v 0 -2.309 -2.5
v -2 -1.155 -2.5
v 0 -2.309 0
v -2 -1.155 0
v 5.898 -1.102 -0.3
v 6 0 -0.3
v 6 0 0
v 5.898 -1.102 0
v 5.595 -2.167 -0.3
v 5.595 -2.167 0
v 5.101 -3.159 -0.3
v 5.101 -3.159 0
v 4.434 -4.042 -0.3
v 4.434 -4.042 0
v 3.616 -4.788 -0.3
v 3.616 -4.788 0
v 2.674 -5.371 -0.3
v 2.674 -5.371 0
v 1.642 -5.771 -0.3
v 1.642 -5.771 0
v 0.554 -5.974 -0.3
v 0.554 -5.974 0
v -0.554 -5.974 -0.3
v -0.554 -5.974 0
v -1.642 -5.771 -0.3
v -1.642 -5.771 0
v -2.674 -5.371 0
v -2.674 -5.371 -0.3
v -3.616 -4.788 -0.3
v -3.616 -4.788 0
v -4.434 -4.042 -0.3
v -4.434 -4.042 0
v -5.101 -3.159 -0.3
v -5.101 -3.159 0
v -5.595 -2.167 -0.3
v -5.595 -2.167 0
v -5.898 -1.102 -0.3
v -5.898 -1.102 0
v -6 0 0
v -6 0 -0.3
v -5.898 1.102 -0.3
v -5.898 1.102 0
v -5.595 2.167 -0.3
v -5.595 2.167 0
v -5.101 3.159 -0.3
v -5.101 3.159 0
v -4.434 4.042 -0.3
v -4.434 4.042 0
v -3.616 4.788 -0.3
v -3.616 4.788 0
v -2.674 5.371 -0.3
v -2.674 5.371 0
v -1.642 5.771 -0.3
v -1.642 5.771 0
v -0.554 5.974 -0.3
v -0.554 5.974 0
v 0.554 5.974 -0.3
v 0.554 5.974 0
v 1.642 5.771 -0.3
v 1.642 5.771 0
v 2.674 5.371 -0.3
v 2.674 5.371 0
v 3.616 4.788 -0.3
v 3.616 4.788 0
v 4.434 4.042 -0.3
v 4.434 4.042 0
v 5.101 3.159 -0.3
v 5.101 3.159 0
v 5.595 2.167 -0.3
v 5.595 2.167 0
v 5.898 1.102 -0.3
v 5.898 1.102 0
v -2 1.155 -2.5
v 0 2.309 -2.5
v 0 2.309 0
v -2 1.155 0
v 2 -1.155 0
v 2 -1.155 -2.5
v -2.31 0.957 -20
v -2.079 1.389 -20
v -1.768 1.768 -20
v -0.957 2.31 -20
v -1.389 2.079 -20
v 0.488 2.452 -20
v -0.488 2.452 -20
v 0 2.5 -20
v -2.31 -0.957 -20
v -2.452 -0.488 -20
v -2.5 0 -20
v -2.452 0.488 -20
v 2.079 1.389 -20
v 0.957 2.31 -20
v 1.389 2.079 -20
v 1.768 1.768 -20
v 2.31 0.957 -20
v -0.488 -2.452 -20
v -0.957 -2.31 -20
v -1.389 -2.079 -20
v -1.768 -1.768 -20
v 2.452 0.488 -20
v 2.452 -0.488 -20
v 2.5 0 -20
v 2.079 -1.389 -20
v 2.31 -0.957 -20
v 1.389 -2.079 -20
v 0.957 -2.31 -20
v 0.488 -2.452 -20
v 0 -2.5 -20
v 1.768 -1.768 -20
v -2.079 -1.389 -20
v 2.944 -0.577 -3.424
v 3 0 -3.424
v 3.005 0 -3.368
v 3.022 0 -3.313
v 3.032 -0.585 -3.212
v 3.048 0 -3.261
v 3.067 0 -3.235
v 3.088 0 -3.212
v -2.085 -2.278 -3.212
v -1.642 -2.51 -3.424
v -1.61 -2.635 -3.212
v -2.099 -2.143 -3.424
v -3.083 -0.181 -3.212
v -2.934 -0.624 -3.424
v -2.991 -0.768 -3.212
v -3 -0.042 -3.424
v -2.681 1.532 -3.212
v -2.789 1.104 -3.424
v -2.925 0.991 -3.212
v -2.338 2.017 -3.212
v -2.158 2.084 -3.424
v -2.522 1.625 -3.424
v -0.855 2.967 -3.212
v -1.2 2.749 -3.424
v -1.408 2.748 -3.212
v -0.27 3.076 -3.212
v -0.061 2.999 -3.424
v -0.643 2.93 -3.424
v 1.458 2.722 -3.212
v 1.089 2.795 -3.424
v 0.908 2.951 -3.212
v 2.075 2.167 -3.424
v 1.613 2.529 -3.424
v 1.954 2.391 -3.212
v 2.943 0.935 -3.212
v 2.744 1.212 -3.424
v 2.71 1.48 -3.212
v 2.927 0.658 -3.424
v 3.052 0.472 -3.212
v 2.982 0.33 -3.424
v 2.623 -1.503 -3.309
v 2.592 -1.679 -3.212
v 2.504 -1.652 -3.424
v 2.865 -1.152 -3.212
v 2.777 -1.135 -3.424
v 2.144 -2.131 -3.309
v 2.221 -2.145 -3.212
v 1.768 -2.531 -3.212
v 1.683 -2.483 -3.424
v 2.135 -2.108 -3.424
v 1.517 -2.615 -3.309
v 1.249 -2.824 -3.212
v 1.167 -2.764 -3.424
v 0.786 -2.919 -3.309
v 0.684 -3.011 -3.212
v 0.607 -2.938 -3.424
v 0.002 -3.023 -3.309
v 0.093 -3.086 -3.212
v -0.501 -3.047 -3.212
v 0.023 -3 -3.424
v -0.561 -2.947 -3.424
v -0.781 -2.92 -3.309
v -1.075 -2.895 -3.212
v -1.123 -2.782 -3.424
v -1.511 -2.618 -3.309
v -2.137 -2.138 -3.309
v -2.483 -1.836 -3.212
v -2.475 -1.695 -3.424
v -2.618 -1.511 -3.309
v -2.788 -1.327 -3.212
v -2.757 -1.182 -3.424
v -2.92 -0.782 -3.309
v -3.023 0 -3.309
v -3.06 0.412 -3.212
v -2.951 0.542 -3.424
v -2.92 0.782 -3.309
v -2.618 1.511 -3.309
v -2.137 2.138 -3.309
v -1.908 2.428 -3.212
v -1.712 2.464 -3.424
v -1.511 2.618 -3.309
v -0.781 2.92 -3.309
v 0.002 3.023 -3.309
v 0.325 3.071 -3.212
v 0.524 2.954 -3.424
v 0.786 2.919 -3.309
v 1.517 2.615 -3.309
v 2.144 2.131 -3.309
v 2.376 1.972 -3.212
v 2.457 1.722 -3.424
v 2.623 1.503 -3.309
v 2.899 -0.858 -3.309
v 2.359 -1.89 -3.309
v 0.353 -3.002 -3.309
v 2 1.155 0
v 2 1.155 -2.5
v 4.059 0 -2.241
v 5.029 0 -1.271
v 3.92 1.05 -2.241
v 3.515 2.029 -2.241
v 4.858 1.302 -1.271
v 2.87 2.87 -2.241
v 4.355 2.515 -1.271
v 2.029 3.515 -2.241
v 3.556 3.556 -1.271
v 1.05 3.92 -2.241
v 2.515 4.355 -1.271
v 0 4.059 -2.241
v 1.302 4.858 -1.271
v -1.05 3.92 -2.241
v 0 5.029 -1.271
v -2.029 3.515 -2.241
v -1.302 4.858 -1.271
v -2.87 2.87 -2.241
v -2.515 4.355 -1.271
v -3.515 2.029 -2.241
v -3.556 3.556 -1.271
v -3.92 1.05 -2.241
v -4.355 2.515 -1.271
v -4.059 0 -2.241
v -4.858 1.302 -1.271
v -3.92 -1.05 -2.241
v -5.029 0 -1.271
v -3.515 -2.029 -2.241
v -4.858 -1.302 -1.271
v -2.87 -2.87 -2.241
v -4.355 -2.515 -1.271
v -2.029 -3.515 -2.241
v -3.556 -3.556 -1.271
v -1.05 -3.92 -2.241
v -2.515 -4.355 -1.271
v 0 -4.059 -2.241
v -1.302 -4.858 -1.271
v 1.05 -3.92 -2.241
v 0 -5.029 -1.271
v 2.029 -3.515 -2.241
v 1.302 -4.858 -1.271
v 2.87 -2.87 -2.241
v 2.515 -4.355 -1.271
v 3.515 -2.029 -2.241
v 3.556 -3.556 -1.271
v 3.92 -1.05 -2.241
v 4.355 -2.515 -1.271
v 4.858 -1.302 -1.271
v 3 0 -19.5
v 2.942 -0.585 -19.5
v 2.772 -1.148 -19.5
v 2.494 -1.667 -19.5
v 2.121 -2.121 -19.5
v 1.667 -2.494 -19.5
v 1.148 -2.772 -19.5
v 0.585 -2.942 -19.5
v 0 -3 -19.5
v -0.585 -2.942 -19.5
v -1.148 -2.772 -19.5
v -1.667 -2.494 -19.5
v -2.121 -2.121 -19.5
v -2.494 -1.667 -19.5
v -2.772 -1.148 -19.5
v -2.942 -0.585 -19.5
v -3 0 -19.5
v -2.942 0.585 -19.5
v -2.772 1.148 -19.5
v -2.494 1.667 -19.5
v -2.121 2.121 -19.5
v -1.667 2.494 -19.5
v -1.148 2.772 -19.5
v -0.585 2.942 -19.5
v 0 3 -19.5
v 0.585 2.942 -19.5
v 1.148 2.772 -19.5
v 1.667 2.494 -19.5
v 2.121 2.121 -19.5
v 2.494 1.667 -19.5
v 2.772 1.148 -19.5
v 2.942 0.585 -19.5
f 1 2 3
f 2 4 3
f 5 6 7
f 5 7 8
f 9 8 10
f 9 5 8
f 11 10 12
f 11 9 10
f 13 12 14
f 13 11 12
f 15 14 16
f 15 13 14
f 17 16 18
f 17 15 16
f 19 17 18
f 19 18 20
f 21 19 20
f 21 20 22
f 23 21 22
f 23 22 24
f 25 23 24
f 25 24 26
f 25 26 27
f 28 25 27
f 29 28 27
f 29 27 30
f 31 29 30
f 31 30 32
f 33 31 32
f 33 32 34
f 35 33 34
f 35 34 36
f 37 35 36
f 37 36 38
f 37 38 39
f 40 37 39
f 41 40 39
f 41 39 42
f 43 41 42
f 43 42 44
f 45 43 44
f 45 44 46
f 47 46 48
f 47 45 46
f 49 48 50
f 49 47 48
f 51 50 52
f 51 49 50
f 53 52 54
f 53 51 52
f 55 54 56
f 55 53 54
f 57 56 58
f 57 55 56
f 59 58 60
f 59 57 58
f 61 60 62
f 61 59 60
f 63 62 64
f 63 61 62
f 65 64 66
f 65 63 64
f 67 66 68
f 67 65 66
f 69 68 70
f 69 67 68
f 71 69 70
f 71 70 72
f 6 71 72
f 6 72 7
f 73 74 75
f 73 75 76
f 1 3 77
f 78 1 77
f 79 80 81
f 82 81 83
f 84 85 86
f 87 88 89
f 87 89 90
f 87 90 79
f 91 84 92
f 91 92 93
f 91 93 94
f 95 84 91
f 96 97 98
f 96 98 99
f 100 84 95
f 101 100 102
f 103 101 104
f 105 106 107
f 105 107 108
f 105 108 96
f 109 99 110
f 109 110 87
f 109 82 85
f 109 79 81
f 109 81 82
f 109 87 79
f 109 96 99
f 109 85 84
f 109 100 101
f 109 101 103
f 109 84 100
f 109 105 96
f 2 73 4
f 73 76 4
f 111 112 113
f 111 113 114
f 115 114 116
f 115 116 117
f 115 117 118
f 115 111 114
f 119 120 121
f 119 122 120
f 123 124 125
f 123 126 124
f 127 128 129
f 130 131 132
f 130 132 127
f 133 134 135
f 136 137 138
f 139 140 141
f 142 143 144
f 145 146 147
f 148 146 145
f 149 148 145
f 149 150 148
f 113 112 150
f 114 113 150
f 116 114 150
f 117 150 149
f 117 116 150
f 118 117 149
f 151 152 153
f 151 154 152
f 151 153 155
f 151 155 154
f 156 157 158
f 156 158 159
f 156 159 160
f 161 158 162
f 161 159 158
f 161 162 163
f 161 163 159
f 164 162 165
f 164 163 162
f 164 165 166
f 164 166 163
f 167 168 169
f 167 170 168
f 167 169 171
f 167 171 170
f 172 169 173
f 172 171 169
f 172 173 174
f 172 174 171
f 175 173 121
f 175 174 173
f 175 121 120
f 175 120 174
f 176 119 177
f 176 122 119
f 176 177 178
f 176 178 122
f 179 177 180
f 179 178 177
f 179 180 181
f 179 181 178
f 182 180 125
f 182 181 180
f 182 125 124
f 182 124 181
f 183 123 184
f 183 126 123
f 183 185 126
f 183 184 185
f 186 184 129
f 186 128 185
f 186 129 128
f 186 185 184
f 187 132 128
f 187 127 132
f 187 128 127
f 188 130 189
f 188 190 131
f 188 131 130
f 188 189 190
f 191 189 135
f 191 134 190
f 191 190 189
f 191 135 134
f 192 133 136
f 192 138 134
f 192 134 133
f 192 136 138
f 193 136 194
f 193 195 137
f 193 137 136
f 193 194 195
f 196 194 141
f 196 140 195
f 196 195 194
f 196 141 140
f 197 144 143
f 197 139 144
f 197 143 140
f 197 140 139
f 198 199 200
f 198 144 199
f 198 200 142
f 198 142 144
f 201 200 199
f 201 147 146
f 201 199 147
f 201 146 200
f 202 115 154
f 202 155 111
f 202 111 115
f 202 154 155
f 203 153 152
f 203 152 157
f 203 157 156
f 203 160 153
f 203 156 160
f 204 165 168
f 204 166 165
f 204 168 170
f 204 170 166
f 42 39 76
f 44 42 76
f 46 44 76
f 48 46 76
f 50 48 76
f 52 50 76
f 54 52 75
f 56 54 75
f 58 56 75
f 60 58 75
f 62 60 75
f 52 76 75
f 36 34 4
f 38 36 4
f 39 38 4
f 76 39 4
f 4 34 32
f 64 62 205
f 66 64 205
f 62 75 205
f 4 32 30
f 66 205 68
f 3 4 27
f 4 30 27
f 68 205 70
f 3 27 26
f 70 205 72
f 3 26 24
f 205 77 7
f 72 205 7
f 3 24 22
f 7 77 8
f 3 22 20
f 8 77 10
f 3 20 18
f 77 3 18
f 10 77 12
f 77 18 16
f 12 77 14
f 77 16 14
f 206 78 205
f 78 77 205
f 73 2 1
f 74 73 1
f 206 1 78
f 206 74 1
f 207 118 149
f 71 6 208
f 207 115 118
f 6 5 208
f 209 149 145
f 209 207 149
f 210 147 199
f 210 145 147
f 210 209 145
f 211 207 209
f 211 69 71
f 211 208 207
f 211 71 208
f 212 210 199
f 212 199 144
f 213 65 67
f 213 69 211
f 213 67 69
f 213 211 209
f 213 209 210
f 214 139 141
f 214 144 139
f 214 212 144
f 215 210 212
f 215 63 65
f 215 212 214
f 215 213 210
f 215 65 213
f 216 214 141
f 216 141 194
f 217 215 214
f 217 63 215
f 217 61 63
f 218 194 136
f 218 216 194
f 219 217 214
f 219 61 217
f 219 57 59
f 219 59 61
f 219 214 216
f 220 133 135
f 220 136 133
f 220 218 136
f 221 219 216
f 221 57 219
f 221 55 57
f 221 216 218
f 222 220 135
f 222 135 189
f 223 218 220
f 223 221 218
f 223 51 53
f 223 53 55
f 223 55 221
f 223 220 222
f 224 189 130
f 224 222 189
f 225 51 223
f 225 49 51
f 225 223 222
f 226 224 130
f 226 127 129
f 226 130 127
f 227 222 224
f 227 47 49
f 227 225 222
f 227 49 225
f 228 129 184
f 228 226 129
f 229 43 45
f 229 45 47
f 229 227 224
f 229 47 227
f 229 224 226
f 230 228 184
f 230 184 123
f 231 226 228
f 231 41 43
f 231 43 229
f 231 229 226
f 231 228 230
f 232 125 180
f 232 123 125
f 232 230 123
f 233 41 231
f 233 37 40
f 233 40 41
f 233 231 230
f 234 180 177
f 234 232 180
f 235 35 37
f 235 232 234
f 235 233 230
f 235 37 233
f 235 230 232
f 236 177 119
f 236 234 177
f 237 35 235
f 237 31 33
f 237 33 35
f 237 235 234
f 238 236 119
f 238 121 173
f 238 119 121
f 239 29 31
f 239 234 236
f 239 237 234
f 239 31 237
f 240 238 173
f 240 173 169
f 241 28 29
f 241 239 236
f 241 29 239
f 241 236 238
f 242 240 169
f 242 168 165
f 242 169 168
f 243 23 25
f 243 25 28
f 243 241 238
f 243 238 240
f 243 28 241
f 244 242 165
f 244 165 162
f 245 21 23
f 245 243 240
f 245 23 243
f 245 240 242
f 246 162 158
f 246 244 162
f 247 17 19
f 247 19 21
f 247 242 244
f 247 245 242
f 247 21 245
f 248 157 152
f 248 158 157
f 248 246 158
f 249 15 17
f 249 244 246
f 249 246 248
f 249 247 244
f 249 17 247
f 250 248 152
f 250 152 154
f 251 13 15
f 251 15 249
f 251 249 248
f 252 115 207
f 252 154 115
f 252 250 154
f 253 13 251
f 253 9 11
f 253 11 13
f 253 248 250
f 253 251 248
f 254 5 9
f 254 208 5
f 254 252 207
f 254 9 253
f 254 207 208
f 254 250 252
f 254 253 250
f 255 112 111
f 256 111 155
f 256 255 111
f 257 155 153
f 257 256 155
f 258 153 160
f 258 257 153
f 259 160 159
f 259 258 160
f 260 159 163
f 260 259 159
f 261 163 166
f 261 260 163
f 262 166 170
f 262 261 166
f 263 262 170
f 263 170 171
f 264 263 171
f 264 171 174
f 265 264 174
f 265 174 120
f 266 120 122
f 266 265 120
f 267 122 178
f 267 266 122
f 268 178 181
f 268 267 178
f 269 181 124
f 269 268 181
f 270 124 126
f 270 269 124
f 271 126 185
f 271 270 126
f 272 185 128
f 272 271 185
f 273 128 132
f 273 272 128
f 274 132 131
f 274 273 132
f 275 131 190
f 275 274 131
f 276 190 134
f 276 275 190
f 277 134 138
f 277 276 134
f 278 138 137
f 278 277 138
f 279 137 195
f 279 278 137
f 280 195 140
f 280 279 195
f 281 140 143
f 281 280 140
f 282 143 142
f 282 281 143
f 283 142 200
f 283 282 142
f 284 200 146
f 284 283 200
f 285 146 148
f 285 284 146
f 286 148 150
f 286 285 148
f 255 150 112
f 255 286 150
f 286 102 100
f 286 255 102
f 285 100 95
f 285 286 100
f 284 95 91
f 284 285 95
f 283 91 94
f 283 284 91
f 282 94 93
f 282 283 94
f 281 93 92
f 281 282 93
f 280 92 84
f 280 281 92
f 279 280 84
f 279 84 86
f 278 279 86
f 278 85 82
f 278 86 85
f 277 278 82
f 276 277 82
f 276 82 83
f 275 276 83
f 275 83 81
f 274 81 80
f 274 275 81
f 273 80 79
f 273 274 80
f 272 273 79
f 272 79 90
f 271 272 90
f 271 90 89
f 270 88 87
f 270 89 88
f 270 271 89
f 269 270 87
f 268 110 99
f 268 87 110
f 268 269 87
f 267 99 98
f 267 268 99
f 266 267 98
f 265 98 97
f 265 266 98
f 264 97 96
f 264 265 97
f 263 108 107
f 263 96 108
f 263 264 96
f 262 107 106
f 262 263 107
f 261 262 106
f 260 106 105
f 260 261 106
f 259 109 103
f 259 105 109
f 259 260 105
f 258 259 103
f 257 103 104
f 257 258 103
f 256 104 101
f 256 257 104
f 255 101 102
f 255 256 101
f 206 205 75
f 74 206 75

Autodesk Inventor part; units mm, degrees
ref_plane "YZ Plane" through (0, 0, 0) normal (1, 0, 0) x (0, 1, 0)
sketch "Sketch1" plane through (0, 0, 0) normal (0, 1, 0) x (-1, 0, 0)
  point P0 (0, 0)
sketch "Sketch2" plane through (0, 0, 0) normal (0, 1, 0) x (-1, 0, 0)
  line L0 (-3, -20) -> (0, -20)
  line L1 (-3, -3.3) -> (-3, -20)
  line L2 (-6, -0.3) -> (-3, -3.3)
  line L3 (-6, 0) -> (-6, -0.3)
  line L4 (0, 0) -> (-6, 0)
  line L5 (0, -20) -> (0, 0)
  line L6 (0, -20) -> (0, 0)
  line L7 (0, -24) -> (0, 4) projected
  line L8 (1.2, 0) -> (-7.2, 0) projected
  dimension "d3" = 6
  dimension "d5" = 3
  dimension "d7" = 20
  dimension "ParC" = 0.3
  dimension "d22" = 0
  dimension "d23" = 0
  dimension "d43" = 45
revolve "Revolution1" add sketch "Sketch2" angle 360 about axis through (0, 0, -20) along (0, 0, -1)
sketch "Sketch3" plane through (0, 0, 0) normal (0, 0, 1) x (1, 0, 0)
  line L0 (-2, 1.1547) -> (-2, -1.1547)
  line L1 (0, 2.3094) -> (-2, 1.1547)
  line L2 (2, 1.1547) -> (0, 2.3094)
  line L3 (2, -1.1547) -> (2, 1.1547)
  line L4 (0, -2.3094) -> (2, -1.1547)
  line L5 (-2, -1.1547) -> (0, -2.3094)
  circle A0 centre (0, 0) radius 2 construction
  circle A1 centre (0, 0) radius 3 construction
  dimension "d11" = 4
  dimension "d13" = 120
  dimension "d15" = 120
extrude "Extrusion1" cut sketch "Sketch3" against normal blind 2.5
fillet "Fillet1" radius 0.3 1 edges at (-3, 0, -3.3)
chamfer "Chamfer1" distance 0.5 angle 45 1 edges at (-3, 0, -20) measured on face at (2.4612, -1.7154, -14.4748)
thread "Thread1" size "M6x1" class "6g" standard "ISO Metric profile" length 18
ref_plane "MSC_PF1" through (0, 0, 0) normal (1, 0, 0) x (0, 1, 0)
ref_plane "MSC_PT1" through (0, 0, 0) normal (0, 0, -1) x (-1, 0, 0)
equation "\"d3\" = 0.5 * dk"
equation "\"d5\" = 0.5 * NND"
equation "\"d43\" = 0.5 * ang"
equation "\"d18\" = r"
equation "\"d19\" = 0.5 * PTC"
equation "\"d39\" = 0.5 * PTC"
equation "\"d11\" = ParS"
equation "\"d16\" = ParT"
equation "\"NND\" = 6"
equation "\"PTC\" = 1"
equation "\"dk\" = 12"
equation "\"ParK\" = 3.3"
equation "\"ParS\" = 4"
equation "\"ParT\" = 2.5"
equation "\"r\" = 0.3"
equation "\"NLG\" = 25"
equation "\"ang\" = 90deg"
equation "\"THREADDIA\" = NND"
properties part number "CSK Allen Key 6x20mm" material "Steel, Mild"
